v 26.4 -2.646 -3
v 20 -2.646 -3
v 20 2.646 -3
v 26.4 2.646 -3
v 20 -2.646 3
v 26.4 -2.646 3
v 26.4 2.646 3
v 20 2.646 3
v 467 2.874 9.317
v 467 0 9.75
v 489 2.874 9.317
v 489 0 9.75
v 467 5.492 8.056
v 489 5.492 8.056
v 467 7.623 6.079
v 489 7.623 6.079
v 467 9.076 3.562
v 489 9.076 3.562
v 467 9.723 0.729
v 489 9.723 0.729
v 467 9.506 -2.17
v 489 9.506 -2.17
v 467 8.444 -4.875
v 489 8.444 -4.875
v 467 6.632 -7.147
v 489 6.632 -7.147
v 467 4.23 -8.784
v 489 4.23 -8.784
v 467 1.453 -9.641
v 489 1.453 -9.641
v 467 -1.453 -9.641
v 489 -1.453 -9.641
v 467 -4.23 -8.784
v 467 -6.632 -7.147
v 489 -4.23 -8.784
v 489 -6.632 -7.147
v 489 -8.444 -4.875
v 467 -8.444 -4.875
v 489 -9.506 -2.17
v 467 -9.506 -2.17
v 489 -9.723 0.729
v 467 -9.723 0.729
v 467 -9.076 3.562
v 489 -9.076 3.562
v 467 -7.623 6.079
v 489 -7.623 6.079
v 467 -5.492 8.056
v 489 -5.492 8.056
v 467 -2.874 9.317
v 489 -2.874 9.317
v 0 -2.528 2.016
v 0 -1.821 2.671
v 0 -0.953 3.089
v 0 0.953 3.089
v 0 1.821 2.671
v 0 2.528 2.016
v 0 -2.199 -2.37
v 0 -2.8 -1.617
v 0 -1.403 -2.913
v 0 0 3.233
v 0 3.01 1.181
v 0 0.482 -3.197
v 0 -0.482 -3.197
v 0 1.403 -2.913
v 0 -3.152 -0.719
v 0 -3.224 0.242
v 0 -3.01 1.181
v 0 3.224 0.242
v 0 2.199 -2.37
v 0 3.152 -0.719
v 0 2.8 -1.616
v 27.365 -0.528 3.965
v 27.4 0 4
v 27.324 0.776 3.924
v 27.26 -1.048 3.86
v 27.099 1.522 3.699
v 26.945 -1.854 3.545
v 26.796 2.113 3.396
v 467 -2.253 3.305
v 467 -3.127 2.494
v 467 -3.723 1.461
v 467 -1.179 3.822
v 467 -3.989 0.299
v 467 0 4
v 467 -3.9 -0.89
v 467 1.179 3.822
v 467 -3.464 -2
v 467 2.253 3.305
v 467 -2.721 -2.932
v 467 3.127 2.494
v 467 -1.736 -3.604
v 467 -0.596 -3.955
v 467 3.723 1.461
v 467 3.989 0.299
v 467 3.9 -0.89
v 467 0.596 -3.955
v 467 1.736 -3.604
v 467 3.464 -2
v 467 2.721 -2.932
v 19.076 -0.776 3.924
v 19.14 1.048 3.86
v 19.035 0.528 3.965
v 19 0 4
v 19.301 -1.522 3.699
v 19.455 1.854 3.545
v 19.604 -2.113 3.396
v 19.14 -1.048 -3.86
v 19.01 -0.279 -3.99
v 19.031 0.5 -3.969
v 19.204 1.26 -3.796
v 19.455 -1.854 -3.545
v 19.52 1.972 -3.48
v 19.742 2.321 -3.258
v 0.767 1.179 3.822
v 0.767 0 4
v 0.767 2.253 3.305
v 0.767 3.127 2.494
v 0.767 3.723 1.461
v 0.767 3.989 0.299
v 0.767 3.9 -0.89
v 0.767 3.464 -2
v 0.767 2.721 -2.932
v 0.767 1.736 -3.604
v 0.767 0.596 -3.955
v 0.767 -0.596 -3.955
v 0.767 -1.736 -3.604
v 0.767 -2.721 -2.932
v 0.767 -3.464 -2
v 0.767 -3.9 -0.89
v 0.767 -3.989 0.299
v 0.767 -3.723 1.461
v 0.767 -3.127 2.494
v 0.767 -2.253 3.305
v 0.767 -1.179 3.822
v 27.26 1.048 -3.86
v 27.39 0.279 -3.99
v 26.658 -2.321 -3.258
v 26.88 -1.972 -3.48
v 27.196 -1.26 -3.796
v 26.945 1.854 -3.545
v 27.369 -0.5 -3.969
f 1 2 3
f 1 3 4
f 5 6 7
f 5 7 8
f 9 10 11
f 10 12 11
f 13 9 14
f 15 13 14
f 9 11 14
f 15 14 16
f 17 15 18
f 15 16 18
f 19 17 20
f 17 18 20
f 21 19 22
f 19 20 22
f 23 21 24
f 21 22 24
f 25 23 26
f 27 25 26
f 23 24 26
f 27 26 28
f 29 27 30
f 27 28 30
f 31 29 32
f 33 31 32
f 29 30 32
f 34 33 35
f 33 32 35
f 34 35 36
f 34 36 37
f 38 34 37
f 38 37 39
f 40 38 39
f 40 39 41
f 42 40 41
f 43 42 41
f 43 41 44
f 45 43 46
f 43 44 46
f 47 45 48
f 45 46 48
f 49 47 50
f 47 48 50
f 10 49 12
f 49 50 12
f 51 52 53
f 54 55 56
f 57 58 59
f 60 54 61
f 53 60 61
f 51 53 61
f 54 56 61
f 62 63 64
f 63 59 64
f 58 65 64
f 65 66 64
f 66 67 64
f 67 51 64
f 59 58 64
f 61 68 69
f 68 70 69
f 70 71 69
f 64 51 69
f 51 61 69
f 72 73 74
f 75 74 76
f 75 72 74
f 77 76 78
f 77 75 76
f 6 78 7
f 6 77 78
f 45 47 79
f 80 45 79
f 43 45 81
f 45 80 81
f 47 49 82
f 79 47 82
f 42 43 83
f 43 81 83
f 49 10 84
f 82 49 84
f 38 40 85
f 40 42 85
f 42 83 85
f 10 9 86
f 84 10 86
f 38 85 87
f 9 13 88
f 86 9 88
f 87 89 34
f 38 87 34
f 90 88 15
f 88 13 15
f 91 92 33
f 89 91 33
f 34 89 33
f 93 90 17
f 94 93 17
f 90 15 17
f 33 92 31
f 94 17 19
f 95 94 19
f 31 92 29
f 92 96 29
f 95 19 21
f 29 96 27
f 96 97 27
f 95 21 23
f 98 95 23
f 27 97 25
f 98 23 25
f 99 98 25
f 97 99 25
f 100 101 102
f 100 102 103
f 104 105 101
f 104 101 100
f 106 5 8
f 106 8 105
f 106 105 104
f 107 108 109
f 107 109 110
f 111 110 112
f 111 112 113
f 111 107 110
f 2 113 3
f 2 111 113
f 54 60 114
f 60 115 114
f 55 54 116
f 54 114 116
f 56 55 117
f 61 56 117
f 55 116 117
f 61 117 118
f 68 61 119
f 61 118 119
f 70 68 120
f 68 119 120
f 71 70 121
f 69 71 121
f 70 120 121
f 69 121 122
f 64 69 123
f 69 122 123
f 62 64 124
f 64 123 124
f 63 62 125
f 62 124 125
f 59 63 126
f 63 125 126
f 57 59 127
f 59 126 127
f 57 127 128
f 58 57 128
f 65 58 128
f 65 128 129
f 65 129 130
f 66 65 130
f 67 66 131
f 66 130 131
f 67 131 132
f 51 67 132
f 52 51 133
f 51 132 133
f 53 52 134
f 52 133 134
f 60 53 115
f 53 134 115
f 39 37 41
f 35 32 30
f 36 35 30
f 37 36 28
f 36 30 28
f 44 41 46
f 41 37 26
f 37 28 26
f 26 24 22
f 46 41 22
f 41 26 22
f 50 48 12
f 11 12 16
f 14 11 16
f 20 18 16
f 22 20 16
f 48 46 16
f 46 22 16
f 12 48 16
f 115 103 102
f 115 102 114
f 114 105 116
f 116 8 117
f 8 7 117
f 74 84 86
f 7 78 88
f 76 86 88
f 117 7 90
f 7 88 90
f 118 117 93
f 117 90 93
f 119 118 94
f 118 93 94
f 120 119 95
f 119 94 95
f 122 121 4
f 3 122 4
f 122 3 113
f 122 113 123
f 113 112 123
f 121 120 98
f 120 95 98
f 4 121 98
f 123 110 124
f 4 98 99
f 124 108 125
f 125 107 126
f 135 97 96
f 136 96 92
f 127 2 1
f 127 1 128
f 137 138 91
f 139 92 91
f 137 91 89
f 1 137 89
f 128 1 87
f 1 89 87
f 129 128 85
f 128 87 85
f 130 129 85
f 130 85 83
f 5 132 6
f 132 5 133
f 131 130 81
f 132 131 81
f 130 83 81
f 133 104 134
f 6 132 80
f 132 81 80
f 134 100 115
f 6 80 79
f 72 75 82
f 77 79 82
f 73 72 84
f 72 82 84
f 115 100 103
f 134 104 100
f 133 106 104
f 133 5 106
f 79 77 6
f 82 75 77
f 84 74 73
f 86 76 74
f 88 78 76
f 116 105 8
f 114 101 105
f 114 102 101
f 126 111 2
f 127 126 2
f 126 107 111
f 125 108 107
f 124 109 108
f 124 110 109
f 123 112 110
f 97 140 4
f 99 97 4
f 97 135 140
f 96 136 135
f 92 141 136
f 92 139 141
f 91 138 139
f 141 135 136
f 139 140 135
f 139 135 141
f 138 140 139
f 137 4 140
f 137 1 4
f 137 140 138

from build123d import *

# Parameters (mm, degrees)
CUT_EXTRUDE_1_DEPTH      = 3
CUT_EXTRUDE_1_DEPTH_BACK = 3


with BuildPart() as part:
    # 草图1 → 旋转1 (revolve)
    with BuildSketch(Plane.XY):
        Polygon((0, 0), (0, 3.233), (0.767, 4), (467, 4), (467, 9.75), (489, 9.75), (489, 0), align=None)
    revolve(axis=Axis((489, 0, 0), (-1, 0, 0)))

    # 草图2 → 切除-拉伸1 (cut, two sides: drawn at the far end of the back side and taken through both)
    with BuildSketch(Plane(origin=(0, 0, 0), x_dir=(1, 0, 0), z_dir=(0, 1, 0)).offset(-CUT_EXTRUDE_1_DEPTH_BACK)):
        Polygon((-5, -12), (35.4, -12), (26.4, -3), (20, -3), (18, -5), (18, -10), (-3, -10), (-3, 10), (18, 10), (18, 5), (20, 3), (26.4, 3), (35.4, 12), (-5, 12), align=None)
    extrude(amount=CUT_EXTRUDE_1_DEPTH + CUT_EXTRUDE_1_DEPTH_BACK, mode=Mode.SUBTRACT)


solid = part.part
